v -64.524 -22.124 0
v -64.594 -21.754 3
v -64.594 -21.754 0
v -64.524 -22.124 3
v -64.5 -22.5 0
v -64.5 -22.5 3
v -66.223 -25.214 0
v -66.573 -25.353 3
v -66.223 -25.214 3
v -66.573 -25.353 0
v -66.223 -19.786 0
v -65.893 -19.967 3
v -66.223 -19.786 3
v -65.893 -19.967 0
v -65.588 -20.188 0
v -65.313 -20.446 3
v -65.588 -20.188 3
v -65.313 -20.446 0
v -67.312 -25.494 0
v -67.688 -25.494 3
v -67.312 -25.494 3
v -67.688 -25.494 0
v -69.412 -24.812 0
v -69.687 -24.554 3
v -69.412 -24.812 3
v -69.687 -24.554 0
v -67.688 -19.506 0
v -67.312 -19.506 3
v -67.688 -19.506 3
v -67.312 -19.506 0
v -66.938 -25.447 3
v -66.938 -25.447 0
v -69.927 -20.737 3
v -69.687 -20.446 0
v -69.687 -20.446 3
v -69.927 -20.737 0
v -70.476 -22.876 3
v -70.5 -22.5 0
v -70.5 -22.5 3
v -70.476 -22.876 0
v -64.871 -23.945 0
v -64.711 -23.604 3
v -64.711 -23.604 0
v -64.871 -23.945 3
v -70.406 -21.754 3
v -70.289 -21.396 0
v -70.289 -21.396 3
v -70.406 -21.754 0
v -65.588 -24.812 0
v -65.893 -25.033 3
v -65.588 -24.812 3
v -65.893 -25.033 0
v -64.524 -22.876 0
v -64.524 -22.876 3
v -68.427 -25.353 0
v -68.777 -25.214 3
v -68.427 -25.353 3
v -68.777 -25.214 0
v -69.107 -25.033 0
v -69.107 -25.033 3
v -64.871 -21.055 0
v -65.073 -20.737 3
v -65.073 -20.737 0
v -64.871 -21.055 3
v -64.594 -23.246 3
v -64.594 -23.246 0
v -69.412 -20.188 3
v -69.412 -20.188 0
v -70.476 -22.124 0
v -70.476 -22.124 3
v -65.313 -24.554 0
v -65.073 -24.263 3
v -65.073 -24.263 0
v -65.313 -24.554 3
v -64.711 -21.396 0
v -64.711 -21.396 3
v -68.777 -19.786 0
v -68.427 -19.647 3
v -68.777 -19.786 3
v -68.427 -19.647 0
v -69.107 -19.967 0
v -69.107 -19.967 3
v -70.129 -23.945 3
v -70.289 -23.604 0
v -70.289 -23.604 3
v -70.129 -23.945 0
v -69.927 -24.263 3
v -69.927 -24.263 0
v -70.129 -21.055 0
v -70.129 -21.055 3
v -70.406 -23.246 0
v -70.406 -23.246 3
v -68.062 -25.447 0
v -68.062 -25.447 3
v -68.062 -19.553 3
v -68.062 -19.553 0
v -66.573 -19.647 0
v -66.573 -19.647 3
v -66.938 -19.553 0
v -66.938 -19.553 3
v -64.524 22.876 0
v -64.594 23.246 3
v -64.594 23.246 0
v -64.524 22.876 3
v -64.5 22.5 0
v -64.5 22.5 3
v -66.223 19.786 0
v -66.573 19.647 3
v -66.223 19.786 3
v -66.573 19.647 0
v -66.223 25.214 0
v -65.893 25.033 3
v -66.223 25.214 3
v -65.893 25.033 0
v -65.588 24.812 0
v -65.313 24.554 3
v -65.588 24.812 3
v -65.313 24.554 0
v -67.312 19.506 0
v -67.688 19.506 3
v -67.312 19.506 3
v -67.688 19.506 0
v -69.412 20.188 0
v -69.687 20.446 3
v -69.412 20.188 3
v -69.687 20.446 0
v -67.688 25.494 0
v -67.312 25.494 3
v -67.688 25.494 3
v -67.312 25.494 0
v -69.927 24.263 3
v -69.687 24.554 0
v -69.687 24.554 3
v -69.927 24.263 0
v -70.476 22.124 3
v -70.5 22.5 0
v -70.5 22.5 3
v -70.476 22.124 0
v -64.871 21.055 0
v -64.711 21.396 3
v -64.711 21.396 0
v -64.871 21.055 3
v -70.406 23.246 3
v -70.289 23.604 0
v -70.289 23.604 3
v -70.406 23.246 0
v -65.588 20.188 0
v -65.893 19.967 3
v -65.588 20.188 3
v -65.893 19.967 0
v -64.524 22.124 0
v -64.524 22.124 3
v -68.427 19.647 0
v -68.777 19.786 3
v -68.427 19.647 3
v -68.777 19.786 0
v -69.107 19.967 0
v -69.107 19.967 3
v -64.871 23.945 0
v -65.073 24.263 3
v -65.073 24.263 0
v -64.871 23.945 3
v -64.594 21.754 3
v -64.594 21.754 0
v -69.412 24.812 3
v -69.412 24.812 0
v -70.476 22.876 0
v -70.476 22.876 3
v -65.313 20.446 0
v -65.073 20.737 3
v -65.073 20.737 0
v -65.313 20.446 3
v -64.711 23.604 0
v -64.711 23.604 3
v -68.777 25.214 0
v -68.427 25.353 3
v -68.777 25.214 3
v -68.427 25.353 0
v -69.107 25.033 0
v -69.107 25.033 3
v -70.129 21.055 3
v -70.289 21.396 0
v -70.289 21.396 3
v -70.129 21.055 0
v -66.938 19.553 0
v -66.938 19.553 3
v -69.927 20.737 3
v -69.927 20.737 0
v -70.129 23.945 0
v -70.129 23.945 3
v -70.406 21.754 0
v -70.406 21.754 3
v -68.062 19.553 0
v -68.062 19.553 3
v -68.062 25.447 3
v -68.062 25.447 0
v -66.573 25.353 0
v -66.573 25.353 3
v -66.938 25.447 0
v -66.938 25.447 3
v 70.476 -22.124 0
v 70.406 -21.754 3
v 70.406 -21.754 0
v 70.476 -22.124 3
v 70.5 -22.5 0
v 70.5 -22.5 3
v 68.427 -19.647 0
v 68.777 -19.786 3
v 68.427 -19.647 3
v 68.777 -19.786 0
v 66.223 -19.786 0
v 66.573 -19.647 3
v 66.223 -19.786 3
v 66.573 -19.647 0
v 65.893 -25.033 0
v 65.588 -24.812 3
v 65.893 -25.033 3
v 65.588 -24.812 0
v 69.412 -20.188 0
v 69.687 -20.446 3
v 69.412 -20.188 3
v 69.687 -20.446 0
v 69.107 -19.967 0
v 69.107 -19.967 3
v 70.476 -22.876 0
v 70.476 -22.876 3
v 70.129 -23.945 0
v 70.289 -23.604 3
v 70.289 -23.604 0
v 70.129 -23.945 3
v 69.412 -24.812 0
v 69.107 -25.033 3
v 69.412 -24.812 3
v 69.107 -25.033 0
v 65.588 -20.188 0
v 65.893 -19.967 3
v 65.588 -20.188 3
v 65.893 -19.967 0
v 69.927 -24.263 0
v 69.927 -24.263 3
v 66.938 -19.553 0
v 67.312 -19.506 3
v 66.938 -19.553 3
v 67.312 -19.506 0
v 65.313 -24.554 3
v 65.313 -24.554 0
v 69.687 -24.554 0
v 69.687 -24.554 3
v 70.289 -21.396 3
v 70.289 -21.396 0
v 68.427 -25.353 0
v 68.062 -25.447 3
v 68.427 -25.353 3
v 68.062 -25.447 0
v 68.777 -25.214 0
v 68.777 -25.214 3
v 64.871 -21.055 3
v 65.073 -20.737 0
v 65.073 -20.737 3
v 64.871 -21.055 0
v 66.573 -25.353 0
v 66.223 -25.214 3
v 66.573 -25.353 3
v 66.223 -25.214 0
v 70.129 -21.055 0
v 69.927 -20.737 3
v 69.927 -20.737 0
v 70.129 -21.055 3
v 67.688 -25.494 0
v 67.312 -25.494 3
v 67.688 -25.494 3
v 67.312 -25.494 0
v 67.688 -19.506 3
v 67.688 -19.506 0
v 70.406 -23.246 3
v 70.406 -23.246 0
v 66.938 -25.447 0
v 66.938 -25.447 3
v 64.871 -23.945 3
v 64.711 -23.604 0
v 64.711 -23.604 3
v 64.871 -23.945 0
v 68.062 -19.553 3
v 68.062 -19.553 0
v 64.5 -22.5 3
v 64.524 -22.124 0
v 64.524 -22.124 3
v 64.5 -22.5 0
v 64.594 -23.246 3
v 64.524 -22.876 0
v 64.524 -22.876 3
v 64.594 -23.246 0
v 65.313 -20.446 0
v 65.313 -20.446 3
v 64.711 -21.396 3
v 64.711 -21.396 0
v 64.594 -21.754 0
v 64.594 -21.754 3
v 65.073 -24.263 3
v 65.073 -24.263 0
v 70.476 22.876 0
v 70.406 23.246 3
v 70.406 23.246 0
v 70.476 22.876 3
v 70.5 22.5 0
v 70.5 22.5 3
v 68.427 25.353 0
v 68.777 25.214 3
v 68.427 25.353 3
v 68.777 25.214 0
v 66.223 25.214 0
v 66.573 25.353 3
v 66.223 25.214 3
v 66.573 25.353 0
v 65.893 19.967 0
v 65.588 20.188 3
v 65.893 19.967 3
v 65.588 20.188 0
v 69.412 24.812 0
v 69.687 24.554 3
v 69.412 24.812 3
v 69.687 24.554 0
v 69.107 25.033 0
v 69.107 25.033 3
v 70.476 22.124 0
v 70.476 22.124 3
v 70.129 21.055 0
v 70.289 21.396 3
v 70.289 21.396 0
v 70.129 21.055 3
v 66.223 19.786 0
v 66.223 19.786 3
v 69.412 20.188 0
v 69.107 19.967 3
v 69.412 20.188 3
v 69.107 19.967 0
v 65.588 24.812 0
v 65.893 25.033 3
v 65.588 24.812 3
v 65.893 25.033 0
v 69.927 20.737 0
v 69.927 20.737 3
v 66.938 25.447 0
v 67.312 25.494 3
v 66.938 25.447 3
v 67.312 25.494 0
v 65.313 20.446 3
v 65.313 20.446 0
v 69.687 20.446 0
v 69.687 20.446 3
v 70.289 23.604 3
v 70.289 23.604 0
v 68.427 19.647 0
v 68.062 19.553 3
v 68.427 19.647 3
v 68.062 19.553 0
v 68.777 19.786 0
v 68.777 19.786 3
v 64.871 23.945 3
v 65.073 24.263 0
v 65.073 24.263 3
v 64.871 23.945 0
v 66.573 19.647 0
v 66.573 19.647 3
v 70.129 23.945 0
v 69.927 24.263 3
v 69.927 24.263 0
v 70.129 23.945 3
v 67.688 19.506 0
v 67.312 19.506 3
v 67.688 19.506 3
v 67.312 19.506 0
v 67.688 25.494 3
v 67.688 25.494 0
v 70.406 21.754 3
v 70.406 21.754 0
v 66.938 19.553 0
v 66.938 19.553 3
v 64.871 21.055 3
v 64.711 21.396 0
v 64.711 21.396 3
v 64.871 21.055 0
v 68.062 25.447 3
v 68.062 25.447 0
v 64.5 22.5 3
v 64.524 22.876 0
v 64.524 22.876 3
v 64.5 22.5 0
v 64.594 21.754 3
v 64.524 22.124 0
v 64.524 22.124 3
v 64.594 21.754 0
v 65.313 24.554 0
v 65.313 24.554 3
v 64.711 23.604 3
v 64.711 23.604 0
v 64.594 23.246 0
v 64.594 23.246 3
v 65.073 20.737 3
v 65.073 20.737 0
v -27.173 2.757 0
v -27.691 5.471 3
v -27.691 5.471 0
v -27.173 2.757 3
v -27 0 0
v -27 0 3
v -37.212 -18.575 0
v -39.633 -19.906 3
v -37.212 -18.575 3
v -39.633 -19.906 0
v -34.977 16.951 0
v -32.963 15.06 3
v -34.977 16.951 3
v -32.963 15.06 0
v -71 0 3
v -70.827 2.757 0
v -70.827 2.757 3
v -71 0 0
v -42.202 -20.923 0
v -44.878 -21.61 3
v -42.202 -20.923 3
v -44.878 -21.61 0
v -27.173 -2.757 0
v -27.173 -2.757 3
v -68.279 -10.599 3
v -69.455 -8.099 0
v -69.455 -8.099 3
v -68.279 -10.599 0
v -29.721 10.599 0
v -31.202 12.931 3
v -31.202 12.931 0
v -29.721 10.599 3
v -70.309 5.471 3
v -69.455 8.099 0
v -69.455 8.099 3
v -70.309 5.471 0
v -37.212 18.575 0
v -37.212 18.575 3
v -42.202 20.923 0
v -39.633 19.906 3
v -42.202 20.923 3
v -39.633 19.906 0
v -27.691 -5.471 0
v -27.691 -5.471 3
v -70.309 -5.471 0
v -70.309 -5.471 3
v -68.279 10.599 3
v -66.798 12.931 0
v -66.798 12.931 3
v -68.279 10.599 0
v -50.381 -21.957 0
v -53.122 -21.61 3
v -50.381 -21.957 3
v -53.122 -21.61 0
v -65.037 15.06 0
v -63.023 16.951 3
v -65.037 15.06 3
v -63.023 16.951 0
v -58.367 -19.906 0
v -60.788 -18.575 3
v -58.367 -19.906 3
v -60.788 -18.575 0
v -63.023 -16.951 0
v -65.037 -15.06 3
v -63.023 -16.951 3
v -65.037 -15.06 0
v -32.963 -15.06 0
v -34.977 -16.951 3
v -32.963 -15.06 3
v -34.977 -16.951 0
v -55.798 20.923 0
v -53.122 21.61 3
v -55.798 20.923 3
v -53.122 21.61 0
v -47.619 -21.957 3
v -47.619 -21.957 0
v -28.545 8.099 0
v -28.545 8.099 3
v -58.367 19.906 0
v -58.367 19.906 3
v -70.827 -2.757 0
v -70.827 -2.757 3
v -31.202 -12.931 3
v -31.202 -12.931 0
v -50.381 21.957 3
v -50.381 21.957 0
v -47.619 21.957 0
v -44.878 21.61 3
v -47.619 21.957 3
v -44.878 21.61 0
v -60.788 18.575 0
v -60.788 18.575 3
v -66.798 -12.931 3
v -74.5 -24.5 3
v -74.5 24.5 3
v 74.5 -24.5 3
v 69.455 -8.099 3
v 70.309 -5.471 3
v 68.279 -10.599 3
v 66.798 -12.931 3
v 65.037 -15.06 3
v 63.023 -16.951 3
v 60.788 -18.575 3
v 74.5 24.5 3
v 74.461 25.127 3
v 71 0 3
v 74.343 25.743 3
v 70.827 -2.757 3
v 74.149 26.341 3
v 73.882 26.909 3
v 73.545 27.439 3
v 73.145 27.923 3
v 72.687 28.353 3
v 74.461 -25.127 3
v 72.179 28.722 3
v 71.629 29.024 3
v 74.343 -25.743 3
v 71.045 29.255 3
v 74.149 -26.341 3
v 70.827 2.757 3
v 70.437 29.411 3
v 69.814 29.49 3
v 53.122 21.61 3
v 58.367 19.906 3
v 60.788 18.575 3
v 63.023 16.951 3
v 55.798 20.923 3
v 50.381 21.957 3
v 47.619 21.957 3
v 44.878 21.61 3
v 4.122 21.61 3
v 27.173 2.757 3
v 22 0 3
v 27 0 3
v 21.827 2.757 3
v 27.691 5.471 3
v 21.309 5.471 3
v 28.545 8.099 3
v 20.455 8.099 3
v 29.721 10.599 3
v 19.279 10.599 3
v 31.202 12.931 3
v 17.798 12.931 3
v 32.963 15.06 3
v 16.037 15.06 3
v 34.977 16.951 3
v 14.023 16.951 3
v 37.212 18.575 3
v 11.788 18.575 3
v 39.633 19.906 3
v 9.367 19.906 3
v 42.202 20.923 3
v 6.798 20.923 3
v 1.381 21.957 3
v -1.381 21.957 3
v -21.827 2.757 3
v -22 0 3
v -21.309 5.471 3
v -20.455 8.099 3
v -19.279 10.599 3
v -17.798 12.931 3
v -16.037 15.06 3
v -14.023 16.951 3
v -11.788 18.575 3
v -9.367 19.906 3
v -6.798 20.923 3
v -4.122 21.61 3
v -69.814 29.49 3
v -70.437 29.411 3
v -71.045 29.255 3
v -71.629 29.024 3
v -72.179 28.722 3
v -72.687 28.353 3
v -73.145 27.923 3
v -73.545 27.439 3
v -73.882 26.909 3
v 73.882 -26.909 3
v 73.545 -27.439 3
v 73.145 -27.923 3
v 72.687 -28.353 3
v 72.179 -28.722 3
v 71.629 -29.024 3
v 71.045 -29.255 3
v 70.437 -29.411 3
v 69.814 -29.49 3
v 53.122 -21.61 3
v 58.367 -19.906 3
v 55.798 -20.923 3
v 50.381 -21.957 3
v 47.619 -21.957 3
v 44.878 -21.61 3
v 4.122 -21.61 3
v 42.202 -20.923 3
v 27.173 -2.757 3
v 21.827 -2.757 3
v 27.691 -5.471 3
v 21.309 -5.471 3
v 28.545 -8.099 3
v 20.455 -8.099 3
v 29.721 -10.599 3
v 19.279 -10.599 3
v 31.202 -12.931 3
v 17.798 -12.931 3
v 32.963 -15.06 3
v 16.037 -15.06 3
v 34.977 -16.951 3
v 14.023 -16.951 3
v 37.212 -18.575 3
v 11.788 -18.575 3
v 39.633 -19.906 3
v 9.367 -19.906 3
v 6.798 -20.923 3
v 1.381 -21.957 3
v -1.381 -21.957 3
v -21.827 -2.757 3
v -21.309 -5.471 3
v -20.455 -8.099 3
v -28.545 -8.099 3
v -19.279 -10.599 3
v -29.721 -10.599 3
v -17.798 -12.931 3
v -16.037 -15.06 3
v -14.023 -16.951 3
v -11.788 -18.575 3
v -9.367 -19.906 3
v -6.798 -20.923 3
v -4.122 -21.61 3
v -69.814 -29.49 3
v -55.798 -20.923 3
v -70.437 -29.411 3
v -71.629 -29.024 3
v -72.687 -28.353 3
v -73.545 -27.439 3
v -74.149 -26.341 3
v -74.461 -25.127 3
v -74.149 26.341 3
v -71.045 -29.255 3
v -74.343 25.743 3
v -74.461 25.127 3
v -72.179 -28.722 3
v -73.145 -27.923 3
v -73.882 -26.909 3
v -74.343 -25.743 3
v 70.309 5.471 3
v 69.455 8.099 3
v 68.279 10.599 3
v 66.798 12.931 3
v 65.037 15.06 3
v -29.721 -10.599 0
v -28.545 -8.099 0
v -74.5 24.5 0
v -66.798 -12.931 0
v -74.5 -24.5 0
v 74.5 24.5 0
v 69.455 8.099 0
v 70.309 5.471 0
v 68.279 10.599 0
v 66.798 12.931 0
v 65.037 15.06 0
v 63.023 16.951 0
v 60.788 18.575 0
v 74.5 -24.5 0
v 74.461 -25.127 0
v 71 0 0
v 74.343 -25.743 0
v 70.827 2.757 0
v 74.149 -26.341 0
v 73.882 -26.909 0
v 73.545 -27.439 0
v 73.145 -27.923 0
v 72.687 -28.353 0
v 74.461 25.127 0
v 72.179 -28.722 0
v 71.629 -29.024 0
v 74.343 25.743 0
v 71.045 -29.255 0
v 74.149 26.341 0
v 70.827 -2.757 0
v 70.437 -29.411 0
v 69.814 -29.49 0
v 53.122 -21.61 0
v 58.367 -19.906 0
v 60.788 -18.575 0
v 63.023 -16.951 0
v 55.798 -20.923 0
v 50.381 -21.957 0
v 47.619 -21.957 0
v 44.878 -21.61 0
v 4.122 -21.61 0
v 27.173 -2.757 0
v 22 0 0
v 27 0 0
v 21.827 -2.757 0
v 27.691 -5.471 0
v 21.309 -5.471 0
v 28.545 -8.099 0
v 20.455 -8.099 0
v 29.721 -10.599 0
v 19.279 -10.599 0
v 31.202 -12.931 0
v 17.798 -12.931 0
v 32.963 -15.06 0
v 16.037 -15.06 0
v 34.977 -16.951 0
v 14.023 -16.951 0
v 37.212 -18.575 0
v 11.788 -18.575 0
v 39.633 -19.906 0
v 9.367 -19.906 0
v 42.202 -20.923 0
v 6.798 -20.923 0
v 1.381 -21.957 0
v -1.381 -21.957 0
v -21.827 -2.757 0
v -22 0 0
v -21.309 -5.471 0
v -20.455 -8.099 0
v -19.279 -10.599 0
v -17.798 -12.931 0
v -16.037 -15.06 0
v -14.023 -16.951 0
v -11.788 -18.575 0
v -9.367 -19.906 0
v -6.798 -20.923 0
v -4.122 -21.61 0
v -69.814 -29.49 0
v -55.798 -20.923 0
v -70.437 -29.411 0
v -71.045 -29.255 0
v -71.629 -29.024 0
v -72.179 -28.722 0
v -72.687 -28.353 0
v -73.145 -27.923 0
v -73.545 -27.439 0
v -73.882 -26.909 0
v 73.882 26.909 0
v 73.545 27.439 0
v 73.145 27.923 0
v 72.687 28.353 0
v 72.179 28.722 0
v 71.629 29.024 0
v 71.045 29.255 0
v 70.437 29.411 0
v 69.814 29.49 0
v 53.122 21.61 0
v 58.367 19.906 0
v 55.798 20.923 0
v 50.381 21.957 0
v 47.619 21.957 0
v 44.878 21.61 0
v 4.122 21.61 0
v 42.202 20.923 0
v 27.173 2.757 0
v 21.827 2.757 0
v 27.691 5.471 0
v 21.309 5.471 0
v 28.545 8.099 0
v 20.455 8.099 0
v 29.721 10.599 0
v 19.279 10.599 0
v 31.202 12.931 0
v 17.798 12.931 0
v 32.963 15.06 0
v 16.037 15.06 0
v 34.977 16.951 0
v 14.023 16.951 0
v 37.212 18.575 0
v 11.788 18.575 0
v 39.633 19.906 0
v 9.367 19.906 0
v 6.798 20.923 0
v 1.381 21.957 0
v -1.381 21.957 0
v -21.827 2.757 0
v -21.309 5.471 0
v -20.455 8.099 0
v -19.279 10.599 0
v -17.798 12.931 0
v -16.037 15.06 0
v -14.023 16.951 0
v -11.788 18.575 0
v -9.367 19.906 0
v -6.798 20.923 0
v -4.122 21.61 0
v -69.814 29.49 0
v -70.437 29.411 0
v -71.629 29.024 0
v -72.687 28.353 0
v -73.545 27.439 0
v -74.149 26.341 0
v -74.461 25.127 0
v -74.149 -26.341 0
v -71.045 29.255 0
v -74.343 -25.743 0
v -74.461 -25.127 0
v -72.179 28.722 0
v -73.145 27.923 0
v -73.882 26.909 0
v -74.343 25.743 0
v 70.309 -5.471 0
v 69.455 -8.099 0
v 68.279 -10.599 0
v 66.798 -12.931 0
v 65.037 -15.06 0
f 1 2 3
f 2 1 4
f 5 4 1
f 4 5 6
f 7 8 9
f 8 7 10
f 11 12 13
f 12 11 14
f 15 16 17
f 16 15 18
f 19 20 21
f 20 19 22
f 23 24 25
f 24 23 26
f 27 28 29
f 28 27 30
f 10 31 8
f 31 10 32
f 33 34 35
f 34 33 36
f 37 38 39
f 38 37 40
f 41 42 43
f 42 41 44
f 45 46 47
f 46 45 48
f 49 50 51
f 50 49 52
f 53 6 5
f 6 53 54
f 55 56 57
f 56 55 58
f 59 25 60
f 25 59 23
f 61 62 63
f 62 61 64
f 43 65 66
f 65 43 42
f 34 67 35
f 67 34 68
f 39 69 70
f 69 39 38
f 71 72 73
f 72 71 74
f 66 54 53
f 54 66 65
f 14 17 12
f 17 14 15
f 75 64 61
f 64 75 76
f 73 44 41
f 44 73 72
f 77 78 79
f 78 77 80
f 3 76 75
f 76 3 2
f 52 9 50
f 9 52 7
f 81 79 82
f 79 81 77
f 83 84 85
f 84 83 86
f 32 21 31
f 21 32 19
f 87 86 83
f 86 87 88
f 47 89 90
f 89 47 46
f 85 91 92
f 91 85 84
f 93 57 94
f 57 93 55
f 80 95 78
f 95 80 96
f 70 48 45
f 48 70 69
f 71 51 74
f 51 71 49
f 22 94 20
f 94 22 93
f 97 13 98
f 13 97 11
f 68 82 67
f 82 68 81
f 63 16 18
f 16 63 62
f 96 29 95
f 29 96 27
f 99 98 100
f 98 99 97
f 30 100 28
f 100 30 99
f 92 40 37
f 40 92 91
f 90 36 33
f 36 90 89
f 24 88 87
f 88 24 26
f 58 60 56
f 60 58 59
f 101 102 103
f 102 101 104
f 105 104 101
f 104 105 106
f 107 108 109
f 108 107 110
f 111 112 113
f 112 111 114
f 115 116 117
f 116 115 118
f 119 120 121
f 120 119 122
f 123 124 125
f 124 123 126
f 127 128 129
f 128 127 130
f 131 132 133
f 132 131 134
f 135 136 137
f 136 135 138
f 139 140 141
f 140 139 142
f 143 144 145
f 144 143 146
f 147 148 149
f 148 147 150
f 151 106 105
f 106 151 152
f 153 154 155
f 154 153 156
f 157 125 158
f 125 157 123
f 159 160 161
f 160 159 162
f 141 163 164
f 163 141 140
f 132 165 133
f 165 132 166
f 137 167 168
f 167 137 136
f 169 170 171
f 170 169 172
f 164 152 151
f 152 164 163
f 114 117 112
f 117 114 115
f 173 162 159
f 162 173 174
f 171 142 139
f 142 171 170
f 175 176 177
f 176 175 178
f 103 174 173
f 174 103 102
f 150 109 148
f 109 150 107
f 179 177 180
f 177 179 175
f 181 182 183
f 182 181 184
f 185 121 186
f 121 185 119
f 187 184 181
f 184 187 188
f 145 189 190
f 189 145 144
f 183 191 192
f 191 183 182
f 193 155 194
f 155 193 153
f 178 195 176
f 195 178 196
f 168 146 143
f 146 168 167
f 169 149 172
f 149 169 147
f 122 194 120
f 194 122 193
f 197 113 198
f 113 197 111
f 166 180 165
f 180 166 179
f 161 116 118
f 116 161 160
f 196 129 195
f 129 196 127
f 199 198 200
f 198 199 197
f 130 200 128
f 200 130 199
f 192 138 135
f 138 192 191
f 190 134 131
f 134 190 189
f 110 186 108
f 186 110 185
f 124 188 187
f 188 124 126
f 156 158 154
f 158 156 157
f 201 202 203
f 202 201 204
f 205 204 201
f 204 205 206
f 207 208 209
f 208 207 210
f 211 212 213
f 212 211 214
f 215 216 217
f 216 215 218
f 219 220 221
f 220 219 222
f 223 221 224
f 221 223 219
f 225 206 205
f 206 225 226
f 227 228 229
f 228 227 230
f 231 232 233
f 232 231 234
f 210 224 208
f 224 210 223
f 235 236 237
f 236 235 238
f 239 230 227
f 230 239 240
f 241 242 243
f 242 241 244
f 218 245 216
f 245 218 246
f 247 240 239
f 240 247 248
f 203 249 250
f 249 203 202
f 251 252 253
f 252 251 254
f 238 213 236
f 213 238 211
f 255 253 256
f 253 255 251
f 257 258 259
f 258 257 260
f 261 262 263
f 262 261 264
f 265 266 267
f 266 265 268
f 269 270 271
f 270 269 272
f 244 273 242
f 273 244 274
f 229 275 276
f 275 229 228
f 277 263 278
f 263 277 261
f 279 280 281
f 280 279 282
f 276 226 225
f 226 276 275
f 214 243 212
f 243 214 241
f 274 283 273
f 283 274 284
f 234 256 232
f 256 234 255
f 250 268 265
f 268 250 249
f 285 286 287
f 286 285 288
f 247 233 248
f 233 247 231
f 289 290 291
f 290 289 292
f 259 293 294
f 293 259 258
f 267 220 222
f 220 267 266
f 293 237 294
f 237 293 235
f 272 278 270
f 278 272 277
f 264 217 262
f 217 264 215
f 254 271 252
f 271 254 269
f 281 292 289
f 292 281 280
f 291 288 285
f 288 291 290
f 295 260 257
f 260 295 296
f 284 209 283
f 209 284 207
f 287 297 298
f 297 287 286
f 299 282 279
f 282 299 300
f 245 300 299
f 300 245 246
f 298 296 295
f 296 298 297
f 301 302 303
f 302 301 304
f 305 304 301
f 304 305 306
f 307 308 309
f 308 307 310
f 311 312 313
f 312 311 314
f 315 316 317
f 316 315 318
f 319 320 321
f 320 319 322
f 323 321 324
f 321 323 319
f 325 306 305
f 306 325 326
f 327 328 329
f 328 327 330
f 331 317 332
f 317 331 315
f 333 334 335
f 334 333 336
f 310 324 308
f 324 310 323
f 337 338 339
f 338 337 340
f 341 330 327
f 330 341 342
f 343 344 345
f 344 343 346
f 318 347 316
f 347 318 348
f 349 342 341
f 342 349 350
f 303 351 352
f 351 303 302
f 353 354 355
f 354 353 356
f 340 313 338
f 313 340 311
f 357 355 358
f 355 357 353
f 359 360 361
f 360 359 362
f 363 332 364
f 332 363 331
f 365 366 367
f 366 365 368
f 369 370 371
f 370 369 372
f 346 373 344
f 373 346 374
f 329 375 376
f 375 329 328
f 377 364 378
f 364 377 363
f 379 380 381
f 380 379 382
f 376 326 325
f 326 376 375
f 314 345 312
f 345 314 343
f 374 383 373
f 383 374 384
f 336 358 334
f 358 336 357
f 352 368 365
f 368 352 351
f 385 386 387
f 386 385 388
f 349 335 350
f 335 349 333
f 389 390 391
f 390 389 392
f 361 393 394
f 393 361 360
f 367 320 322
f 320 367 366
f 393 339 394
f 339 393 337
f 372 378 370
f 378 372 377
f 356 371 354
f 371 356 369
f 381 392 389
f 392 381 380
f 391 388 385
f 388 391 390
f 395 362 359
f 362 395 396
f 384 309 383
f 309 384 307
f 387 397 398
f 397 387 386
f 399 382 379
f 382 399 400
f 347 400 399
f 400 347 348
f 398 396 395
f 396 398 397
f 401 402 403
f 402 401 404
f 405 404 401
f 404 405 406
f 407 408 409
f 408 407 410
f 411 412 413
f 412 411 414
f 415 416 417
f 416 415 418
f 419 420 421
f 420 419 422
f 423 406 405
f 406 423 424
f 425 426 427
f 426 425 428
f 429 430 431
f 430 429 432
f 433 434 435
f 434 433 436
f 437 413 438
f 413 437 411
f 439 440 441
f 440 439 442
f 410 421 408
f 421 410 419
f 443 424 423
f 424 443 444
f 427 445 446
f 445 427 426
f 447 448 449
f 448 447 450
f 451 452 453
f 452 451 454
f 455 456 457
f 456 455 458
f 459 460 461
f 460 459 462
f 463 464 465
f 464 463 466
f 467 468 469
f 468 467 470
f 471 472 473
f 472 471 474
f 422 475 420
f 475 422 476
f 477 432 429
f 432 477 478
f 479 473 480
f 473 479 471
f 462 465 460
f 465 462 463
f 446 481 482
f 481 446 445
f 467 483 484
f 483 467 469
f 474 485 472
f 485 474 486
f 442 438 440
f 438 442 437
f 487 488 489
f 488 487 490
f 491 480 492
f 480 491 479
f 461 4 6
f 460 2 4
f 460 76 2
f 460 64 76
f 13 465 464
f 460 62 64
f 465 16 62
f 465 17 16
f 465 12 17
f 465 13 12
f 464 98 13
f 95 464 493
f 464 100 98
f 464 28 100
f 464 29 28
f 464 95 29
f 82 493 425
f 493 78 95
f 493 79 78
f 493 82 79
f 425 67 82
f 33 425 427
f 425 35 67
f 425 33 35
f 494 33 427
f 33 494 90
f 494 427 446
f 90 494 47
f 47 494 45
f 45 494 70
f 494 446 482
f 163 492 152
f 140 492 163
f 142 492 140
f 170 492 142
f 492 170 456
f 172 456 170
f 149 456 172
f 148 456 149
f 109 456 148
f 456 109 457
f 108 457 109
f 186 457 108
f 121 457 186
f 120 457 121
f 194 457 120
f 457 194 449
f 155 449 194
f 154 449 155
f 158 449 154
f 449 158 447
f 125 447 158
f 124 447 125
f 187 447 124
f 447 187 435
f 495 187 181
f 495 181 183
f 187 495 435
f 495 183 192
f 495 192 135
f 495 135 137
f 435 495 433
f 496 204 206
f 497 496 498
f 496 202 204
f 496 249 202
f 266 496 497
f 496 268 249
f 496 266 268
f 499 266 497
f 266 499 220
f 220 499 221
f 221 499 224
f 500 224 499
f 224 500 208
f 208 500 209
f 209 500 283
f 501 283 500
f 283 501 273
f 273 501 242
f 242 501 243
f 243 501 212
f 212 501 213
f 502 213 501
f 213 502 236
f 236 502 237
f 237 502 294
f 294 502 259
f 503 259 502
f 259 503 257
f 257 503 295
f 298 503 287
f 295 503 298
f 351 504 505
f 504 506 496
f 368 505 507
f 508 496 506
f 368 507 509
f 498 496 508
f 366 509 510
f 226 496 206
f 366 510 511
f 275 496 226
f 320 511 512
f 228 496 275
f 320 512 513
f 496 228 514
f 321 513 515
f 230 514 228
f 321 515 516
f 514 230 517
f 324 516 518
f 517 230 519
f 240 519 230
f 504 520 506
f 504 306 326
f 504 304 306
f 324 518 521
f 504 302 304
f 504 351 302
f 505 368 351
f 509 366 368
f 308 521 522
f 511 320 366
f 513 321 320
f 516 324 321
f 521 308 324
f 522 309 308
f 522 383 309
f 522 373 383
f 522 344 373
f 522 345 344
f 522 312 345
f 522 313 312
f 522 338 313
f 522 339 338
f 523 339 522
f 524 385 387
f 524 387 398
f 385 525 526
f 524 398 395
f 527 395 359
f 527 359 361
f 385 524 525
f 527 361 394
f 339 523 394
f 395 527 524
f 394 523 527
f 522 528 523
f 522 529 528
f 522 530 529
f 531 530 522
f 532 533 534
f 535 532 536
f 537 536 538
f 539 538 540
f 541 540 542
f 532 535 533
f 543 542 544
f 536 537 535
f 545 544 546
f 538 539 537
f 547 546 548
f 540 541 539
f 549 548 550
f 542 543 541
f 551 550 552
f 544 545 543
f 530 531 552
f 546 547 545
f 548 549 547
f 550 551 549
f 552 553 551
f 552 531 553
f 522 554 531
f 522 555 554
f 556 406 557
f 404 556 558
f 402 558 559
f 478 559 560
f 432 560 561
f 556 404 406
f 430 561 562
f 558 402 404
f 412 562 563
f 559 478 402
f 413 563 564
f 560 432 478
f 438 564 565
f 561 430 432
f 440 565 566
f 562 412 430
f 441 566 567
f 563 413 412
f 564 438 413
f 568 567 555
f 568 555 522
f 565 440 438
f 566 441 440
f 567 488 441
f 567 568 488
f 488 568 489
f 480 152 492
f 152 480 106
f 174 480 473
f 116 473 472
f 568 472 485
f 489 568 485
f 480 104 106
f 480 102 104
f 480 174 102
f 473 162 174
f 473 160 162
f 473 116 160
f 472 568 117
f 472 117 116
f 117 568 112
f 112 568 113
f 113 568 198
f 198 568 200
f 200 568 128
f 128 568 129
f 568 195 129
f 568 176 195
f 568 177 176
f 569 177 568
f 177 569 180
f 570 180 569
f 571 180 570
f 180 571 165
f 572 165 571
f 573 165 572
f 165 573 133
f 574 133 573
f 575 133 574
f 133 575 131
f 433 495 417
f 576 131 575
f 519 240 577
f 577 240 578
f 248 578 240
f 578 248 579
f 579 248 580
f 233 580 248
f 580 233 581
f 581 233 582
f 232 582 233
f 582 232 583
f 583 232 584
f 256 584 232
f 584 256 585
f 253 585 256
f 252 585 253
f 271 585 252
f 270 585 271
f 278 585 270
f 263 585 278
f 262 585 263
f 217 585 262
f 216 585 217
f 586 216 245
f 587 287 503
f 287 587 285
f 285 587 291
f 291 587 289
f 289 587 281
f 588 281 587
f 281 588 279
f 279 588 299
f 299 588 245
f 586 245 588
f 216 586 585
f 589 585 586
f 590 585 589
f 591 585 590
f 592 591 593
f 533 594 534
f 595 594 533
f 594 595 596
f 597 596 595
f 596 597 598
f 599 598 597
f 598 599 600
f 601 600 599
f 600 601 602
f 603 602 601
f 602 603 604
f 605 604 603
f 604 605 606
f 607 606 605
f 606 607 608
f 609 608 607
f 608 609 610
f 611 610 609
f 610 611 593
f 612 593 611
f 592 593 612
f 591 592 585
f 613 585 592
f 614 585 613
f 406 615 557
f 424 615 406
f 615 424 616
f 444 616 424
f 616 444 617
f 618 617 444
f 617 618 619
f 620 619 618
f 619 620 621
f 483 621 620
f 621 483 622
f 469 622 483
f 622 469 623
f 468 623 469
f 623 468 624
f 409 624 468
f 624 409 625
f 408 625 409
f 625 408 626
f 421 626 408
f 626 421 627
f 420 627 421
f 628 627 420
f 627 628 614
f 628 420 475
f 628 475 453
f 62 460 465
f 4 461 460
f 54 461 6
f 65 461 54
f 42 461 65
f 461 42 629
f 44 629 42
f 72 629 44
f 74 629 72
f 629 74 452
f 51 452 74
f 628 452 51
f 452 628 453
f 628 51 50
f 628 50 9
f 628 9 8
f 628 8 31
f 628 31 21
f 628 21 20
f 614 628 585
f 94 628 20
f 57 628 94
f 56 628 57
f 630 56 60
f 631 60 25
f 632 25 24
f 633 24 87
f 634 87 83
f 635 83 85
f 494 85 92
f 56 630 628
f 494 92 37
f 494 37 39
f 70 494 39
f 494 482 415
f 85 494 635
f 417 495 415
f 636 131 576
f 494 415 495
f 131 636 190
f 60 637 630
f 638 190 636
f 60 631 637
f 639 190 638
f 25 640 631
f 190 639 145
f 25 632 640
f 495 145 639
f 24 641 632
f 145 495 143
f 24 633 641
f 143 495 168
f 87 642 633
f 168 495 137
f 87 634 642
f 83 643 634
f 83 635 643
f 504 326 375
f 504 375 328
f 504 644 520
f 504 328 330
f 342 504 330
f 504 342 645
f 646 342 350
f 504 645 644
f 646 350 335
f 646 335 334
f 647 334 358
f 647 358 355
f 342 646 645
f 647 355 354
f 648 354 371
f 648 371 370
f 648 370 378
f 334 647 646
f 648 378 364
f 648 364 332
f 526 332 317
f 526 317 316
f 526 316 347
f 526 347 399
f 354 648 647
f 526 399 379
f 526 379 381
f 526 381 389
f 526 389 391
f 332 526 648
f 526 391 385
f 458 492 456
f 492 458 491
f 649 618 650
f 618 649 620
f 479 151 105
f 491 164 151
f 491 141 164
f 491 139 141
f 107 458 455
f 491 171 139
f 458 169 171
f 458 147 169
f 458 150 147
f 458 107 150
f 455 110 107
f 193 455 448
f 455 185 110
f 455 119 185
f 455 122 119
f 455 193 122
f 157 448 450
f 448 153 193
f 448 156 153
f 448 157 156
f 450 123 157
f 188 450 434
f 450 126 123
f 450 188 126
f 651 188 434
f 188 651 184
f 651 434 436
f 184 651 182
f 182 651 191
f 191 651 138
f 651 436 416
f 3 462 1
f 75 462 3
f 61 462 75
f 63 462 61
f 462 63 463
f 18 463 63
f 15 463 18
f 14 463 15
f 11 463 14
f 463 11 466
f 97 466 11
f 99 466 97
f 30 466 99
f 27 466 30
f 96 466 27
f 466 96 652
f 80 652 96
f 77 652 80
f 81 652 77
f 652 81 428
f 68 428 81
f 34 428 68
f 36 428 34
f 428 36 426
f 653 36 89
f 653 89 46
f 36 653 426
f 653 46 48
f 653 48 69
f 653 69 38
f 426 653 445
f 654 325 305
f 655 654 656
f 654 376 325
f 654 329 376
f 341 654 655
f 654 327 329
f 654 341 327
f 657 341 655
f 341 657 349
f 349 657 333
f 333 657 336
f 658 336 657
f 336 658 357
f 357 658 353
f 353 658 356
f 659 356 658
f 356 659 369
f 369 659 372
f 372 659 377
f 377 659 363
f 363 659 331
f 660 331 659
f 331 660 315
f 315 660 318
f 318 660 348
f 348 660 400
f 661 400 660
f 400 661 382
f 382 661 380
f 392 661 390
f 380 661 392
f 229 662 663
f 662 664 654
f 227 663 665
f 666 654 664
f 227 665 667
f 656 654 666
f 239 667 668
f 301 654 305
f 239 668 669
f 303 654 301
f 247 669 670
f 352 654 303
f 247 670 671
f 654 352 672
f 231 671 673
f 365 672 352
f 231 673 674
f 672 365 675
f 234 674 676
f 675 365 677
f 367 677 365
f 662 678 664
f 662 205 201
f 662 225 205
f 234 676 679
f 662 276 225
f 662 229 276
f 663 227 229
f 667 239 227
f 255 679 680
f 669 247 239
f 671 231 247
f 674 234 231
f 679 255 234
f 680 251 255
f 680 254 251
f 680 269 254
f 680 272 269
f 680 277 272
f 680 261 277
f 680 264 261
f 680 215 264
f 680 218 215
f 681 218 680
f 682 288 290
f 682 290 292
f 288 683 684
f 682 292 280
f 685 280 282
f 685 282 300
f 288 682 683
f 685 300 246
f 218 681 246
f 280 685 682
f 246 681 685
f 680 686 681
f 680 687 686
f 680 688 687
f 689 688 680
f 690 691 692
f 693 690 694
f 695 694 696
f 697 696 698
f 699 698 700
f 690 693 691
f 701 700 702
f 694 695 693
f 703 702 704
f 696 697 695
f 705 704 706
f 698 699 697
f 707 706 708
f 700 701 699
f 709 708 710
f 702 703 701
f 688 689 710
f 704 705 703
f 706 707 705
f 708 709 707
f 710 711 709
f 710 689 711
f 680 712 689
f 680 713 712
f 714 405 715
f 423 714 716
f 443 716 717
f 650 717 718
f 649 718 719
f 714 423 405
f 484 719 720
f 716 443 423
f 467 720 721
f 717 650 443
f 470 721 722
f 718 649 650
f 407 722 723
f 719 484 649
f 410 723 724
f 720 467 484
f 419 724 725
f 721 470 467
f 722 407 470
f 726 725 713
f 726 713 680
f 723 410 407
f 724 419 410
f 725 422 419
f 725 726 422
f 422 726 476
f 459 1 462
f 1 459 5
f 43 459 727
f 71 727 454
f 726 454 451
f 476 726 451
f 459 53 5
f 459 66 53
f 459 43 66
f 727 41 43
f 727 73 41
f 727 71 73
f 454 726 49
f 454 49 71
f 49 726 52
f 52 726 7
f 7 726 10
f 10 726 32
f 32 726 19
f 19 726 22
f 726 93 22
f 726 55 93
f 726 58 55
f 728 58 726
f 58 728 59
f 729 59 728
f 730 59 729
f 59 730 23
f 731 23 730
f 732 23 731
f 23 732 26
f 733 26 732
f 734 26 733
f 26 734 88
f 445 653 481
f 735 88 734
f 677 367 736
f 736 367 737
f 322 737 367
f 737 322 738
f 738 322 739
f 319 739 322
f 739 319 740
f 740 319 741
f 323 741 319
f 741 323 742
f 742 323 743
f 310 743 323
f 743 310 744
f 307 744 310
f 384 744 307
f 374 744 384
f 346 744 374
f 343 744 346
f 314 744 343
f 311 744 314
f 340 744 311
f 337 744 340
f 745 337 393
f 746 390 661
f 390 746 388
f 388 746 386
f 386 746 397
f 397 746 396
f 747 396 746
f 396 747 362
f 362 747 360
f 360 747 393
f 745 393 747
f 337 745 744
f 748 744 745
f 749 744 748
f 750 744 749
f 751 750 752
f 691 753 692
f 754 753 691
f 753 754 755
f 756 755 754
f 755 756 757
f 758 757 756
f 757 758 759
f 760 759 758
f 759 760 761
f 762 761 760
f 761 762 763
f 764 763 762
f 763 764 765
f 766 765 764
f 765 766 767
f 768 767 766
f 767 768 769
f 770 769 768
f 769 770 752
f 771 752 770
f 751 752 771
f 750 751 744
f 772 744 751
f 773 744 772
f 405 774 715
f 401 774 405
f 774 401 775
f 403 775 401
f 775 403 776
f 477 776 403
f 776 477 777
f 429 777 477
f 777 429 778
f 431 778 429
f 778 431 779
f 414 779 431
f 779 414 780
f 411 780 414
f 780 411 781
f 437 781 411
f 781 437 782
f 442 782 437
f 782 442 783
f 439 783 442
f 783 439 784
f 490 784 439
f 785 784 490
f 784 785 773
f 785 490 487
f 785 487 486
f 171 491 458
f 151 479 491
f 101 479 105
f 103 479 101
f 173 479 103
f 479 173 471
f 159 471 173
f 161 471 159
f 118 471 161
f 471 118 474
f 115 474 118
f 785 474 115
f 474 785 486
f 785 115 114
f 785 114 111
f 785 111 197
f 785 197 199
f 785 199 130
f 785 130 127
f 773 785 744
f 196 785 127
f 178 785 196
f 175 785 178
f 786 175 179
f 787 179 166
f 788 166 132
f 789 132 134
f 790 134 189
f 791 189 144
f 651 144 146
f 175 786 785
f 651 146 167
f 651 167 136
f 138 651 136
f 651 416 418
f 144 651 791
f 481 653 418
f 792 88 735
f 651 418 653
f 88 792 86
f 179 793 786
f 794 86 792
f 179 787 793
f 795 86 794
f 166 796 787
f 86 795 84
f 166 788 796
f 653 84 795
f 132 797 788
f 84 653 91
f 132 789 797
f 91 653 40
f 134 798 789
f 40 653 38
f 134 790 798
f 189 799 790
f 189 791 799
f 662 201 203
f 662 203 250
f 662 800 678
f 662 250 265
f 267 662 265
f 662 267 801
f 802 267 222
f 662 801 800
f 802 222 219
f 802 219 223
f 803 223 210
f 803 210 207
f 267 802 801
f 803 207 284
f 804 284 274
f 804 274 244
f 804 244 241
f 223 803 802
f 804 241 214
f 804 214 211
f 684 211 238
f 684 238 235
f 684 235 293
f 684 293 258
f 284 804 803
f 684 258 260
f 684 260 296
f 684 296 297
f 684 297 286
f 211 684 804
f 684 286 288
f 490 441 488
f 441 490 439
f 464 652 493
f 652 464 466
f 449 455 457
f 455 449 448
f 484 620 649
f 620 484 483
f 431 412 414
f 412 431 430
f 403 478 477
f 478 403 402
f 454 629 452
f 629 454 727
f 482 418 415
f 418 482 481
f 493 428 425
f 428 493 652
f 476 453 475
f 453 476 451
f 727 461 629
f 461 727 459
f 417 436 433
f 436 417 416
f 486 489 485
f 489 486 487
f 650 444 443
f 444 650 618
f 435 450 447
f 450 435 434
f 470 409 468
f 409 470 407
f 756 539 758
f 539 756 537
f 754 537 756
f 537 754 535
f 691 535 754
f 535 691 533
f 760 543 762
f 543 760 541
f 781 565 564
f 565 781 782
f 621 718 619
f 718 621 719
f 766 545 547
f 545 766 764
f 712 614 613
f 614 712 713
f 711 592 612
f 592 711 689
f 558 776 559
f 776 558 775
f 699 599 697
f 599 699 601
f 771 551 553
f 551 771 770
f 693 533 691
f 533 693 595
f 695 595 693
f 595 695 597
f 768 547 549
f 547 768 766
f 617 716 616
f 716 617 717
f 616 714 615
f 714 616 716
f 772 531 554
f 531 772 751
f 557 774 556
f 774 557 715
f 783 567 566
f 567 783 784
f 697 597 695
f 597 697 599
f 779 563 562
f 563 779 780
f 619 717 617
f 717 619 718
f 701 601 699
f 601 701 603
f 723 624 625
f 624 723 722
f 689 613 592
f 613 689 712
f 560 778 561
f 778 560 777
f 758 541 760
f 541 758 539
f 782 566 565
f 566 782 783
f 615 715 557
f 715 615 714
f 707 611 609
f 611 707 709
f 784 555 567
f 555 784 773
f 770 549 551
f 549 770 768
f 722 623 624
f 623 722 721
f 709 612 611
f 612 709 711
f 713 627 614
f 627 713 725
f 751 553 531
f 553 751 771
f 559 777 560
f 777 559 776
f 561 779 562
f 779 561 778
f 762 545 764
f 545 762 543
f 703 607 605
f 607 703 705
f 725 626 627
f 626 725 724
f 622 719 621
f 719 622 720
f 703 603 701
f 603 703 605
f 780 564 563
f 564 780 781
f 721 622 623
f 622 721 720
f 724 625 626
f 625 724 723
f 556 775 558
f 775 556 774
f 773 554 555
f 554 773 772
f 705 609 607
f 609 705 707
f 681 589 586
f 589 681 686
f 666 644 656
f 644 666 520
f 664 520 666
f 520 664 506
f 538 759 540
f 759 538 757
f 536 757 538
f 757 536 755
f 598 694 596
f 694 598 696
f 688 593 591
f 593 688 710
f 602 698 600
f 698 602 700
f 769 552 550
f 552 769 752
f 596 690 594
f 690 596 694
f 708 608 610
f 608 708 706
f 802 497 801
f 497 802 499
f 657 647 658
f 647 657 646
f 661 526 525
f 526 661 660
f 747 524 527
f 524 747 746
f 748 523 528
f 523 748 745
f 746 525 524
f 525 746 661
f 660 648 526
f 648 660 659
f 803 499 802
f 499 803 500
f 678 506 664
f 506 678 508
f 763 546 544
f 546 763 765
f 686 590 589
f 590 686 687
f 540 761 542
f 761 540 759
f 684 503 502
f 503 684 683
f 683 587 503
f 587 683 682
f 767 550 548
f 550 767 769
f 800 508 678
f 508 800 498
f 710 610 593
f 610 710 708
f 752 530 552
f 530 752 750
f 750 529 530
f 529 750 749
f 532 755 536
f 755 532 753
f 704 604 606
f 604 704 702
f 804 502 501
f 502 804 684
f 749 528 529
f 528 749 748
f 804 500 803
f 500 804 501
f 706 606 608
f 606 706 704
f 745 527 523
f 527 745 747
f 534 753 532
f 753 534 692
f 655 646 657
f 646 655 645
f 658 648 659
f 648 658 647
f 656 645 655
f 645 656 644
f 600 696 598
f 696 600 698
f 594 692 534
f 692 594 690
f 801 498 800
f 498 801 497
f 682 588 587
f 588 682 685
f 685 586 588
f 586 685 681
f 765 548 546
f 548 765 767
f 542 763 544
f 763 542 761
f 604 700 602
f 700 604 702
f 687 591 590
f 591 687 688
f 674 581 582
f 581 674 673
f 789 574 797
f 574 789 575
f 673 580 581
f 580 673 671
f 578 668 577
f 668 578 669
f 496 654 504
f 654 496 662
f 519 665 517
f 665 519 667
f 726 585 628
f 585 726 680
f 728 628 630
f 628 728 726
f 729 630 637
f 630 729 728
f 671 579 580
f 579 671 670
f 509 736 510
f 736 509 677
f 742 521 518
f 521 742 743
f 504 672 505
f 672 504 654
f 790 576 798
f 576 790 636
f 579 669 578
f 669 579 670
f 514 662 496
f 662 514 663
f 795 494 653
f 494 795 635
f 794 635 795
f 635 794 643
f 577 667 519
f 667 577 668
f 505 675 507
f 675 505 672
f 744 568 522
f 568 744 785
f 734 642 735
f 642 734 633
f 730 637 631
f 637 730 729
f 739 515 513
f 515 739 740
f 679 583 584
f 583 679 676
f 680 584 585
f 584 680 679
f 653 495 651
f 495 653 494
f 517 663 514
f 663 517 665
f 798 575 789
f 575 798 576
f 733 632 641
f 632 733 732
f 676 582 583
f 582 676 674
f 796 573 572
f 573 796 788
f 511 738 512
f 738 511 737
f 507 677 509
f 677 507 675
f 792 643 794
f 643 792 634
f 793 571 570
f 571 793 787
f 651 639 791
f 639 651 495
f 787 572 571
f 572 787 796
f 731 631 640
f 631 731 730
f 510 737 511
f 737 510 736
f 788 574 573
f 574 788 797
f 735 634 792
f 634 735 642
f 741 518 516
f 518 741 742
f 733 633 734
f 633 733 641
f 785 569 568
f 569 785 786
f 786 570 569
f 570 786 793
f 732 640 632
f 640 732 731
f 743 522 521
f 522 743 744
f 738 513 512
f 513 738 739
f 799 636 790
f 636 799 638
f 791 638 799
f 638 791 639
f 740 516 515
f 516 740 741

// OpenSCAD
$fn = 50;


difference() {
	union() {
		hull() {
			translate(v = [-69.5000000000, 24.5000000000, 0]) {
				cylinder(h = 3, r = 5);
			}
			translate(v = [69.5000000000, 24.5000000000, 0]) {
				cylinder(h = 3, r = 5);
			}
			translate(v = [-69.5000000000, -24.5000000000, 0]) {
				cylinder(h = 3, r = 5);
			}
			translate(v = [69.5000000000, -24.5000000000, 0]) {
				cylinder(h = 3, r = 5);
			}
		}
	}
	union() {
		#translate(v = [-67.5000000000, -22.5000000000, -100.0000000000]) {
			cylinder(h = 200, r = 3.0000000000);
		}
		#translate(v = [-67.5000000000, 22.5000000000, -100.0000000000]) {
			cylinder(h = 200, r = 3.0000000000);
		}
		#translate(v = [67.5000000000, -22.5000000000, -100.0000000000]) {
			cylinder(h = 200, r = 3.0000000000);
		}
		#translate(v = [67.5000000000, 22.5000000000, -100.0000000000]) {
			cylinder(h = 200, r = 3.0000000000);
		}
		#translate(v = [-49.0000000000, 0, 0]) {
			cylinder(h = 3, r = 22.0000000000);
		}
		#cylinder(h = 3, r = 22.0000000000);
		#translate(v = [49.0000000000, 0, 0]) {
			cylinder(h = 3, r = 22.0000000000);
		}
	}
}
